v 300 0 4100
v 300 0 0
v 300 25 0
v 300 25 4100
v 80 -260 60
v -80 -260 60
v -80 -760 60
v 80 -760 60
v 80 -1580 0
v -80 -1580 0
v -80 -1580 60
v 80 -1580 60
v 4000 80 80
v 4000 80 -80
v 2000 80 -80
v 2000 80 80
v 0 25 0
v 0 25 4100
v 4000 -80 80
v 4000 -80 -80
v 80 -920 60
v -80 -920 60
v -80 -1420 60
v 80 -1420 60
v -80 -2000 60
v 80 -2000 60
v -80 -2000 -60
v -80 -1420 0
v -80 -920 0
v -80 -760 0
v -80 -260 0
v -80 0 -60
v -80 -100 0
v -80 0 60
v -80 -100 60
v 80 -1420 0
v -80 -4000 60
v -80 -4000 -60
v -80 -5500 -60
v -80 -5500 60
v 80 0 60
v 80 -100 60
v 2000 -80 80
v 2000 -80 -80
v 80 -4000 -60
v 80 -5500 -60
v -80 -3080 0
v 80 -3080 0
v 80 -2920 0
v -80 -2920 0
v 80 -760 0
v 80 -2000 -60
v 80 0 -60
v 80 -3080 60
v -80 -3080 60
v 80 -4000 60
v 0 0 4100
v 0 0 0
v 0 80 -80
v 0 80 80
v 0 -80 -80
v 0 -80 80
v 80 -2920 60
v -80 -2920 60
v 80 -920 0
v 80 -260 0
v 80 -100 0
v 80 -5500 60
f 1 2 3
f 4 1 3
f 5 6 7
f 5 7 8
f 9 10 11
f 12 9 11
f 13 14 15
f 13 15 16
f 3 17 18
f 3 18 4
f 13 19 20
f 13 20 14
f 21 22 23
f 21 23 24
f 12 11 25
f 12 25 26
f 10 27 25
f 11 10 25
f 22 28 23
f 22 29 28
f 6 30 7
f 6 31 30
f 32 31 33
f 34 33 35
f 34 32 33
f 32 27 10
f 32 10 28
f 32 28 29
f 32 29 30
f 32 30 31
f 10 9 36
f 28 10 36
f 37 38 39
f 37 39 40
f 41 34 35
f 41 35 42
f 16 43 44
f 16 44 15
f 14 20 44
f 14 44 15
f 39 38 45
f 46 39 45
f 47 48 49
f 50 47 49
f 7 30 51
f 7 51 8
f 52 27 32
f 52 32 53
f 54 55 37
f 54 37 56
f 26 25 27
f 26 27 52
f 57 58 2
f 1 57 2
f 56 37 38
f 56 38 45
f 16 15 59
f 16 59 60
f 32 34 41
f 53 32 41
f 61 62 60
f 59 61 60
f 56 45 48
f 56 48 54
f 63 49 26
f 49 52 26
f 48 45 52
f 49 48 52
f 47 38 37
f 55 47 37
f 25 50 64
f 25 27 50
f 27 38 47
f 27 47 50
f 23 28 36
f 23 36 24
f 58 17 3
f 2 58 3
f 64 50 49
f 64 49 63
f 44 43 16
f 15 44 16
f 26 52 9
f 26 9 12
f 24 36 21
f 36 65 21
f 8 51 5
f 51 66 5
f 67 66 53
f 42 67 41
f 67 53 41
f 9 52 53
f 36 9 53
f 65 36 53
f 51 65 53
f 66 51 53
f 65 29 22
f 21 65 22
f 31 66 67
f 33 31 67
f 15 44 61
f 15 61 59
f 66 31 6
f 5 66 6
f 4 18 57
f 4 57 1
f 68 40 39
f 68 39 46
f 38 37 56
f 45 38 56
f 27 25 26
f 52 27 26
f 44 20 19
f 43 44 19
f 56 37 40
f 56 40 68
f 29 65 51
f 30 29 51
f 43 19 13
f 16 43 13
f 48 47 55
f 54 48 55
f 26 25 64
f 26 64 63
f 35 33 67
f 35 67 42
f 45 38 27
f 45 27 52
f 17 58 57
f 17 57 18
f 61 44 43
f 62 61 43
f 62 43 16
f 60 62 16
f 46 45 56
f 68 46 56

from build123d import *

# Parameters (mm, degrees)
F0_W      = 160
F0_H      = 120
F1_DEPTH  = 2000
F2_DEPTH  = 2000
F3_W      = 160
F3_H      = 60
F4_DEPTH  = 160.001
F5_W      = 300
F5_H      = 25
F6_DEPTH  = 4100
F7_W      = 160
F7_H      = 160
F8_DEPTH  = 2000
F9_DEPTH  = 2000
F10_DEPTH = 1500


with BuildPart() as f1:
    # F0 (on Front) → F1 (new body)
    with BuildSketch(Plane.XZ):
        Rectangle(F0_W, F0_H)
    extrude(amount=F1_DEPTH)


with BuildPart() as f2:
    # F2 (new): a face of the model
    f2_faces = [f1.part.faces().sort_by_distance(p)[0] for p in [
        (0, -2000, 0),
    ]]
    extrude(f2_faces, amount=F2_DEPTH)


with BuildPart() as f4_tool:
    # F3 (on face) → F4 (new body, through all)
    with BuildSketch(Plane.YZ.offset(80)):
        with Locations((-180, 30)):
            Rectangle(F3_W, F3_H)
        with Locations((-840, 30)):
            Rectangle(F3_W, F3_H)
        with Locations((-1500, 30)):
            Rectangle(F3_W, F3_H)
        with Locations((-3000, 30)):
            Rectangle(F3_W, F3_H)
    extrude(amount=-F4_DEPTH)


with BuildPart() as f1_1:
    add(f1.part)

    # F4: cut by f4_tool
    add(f4_tool.part, mode=Mode.SUBTRACT)


with BuildPart() as f2_1:
    add(f2.part)

    # F4: cut by f4_tool
    add(f4_tool.part, mode=Mode.SUBTRACT)


with BuildPart() as f6:
    # F5 (on Top) → F6 (new body)
    with BuildSketch(Plane.XY):
        with Locations((150, 12.5)):
            Rectangle(F5_W, F5_H)
    extrude(amount=F6_DEPTH)


with BuildPart() as f8:
    # F7 (on Right) → F8 (new body)
    with BuildSketch(Plane.YZ):
        Rectangle(F7_W, F7_H)
    extrude(amount=F8_DEPTH)


with BuildPart() as f9:
    # F9 (new): a face of the model
    f9_faces = [f8.part.faces().sort_by_distance(p)[0] for p in [
        (2000, 0, 0),
    ]]
    extrude(f9_faces, amount=F9_DEPTH)


with BuildPart() as f10:
    # F10 (new): a face of the model
    f10_faces = [f2_1.part.faces().sort_by_distance(p)[0] for p in [
        (0, -4000, 0),
    ]]
    extrude(f10_faces, amount=F10_DEPTH)


solid = Compound([f1_1.part, f2_1.part, f6.part, f8.part, f9.part, f10.part])
